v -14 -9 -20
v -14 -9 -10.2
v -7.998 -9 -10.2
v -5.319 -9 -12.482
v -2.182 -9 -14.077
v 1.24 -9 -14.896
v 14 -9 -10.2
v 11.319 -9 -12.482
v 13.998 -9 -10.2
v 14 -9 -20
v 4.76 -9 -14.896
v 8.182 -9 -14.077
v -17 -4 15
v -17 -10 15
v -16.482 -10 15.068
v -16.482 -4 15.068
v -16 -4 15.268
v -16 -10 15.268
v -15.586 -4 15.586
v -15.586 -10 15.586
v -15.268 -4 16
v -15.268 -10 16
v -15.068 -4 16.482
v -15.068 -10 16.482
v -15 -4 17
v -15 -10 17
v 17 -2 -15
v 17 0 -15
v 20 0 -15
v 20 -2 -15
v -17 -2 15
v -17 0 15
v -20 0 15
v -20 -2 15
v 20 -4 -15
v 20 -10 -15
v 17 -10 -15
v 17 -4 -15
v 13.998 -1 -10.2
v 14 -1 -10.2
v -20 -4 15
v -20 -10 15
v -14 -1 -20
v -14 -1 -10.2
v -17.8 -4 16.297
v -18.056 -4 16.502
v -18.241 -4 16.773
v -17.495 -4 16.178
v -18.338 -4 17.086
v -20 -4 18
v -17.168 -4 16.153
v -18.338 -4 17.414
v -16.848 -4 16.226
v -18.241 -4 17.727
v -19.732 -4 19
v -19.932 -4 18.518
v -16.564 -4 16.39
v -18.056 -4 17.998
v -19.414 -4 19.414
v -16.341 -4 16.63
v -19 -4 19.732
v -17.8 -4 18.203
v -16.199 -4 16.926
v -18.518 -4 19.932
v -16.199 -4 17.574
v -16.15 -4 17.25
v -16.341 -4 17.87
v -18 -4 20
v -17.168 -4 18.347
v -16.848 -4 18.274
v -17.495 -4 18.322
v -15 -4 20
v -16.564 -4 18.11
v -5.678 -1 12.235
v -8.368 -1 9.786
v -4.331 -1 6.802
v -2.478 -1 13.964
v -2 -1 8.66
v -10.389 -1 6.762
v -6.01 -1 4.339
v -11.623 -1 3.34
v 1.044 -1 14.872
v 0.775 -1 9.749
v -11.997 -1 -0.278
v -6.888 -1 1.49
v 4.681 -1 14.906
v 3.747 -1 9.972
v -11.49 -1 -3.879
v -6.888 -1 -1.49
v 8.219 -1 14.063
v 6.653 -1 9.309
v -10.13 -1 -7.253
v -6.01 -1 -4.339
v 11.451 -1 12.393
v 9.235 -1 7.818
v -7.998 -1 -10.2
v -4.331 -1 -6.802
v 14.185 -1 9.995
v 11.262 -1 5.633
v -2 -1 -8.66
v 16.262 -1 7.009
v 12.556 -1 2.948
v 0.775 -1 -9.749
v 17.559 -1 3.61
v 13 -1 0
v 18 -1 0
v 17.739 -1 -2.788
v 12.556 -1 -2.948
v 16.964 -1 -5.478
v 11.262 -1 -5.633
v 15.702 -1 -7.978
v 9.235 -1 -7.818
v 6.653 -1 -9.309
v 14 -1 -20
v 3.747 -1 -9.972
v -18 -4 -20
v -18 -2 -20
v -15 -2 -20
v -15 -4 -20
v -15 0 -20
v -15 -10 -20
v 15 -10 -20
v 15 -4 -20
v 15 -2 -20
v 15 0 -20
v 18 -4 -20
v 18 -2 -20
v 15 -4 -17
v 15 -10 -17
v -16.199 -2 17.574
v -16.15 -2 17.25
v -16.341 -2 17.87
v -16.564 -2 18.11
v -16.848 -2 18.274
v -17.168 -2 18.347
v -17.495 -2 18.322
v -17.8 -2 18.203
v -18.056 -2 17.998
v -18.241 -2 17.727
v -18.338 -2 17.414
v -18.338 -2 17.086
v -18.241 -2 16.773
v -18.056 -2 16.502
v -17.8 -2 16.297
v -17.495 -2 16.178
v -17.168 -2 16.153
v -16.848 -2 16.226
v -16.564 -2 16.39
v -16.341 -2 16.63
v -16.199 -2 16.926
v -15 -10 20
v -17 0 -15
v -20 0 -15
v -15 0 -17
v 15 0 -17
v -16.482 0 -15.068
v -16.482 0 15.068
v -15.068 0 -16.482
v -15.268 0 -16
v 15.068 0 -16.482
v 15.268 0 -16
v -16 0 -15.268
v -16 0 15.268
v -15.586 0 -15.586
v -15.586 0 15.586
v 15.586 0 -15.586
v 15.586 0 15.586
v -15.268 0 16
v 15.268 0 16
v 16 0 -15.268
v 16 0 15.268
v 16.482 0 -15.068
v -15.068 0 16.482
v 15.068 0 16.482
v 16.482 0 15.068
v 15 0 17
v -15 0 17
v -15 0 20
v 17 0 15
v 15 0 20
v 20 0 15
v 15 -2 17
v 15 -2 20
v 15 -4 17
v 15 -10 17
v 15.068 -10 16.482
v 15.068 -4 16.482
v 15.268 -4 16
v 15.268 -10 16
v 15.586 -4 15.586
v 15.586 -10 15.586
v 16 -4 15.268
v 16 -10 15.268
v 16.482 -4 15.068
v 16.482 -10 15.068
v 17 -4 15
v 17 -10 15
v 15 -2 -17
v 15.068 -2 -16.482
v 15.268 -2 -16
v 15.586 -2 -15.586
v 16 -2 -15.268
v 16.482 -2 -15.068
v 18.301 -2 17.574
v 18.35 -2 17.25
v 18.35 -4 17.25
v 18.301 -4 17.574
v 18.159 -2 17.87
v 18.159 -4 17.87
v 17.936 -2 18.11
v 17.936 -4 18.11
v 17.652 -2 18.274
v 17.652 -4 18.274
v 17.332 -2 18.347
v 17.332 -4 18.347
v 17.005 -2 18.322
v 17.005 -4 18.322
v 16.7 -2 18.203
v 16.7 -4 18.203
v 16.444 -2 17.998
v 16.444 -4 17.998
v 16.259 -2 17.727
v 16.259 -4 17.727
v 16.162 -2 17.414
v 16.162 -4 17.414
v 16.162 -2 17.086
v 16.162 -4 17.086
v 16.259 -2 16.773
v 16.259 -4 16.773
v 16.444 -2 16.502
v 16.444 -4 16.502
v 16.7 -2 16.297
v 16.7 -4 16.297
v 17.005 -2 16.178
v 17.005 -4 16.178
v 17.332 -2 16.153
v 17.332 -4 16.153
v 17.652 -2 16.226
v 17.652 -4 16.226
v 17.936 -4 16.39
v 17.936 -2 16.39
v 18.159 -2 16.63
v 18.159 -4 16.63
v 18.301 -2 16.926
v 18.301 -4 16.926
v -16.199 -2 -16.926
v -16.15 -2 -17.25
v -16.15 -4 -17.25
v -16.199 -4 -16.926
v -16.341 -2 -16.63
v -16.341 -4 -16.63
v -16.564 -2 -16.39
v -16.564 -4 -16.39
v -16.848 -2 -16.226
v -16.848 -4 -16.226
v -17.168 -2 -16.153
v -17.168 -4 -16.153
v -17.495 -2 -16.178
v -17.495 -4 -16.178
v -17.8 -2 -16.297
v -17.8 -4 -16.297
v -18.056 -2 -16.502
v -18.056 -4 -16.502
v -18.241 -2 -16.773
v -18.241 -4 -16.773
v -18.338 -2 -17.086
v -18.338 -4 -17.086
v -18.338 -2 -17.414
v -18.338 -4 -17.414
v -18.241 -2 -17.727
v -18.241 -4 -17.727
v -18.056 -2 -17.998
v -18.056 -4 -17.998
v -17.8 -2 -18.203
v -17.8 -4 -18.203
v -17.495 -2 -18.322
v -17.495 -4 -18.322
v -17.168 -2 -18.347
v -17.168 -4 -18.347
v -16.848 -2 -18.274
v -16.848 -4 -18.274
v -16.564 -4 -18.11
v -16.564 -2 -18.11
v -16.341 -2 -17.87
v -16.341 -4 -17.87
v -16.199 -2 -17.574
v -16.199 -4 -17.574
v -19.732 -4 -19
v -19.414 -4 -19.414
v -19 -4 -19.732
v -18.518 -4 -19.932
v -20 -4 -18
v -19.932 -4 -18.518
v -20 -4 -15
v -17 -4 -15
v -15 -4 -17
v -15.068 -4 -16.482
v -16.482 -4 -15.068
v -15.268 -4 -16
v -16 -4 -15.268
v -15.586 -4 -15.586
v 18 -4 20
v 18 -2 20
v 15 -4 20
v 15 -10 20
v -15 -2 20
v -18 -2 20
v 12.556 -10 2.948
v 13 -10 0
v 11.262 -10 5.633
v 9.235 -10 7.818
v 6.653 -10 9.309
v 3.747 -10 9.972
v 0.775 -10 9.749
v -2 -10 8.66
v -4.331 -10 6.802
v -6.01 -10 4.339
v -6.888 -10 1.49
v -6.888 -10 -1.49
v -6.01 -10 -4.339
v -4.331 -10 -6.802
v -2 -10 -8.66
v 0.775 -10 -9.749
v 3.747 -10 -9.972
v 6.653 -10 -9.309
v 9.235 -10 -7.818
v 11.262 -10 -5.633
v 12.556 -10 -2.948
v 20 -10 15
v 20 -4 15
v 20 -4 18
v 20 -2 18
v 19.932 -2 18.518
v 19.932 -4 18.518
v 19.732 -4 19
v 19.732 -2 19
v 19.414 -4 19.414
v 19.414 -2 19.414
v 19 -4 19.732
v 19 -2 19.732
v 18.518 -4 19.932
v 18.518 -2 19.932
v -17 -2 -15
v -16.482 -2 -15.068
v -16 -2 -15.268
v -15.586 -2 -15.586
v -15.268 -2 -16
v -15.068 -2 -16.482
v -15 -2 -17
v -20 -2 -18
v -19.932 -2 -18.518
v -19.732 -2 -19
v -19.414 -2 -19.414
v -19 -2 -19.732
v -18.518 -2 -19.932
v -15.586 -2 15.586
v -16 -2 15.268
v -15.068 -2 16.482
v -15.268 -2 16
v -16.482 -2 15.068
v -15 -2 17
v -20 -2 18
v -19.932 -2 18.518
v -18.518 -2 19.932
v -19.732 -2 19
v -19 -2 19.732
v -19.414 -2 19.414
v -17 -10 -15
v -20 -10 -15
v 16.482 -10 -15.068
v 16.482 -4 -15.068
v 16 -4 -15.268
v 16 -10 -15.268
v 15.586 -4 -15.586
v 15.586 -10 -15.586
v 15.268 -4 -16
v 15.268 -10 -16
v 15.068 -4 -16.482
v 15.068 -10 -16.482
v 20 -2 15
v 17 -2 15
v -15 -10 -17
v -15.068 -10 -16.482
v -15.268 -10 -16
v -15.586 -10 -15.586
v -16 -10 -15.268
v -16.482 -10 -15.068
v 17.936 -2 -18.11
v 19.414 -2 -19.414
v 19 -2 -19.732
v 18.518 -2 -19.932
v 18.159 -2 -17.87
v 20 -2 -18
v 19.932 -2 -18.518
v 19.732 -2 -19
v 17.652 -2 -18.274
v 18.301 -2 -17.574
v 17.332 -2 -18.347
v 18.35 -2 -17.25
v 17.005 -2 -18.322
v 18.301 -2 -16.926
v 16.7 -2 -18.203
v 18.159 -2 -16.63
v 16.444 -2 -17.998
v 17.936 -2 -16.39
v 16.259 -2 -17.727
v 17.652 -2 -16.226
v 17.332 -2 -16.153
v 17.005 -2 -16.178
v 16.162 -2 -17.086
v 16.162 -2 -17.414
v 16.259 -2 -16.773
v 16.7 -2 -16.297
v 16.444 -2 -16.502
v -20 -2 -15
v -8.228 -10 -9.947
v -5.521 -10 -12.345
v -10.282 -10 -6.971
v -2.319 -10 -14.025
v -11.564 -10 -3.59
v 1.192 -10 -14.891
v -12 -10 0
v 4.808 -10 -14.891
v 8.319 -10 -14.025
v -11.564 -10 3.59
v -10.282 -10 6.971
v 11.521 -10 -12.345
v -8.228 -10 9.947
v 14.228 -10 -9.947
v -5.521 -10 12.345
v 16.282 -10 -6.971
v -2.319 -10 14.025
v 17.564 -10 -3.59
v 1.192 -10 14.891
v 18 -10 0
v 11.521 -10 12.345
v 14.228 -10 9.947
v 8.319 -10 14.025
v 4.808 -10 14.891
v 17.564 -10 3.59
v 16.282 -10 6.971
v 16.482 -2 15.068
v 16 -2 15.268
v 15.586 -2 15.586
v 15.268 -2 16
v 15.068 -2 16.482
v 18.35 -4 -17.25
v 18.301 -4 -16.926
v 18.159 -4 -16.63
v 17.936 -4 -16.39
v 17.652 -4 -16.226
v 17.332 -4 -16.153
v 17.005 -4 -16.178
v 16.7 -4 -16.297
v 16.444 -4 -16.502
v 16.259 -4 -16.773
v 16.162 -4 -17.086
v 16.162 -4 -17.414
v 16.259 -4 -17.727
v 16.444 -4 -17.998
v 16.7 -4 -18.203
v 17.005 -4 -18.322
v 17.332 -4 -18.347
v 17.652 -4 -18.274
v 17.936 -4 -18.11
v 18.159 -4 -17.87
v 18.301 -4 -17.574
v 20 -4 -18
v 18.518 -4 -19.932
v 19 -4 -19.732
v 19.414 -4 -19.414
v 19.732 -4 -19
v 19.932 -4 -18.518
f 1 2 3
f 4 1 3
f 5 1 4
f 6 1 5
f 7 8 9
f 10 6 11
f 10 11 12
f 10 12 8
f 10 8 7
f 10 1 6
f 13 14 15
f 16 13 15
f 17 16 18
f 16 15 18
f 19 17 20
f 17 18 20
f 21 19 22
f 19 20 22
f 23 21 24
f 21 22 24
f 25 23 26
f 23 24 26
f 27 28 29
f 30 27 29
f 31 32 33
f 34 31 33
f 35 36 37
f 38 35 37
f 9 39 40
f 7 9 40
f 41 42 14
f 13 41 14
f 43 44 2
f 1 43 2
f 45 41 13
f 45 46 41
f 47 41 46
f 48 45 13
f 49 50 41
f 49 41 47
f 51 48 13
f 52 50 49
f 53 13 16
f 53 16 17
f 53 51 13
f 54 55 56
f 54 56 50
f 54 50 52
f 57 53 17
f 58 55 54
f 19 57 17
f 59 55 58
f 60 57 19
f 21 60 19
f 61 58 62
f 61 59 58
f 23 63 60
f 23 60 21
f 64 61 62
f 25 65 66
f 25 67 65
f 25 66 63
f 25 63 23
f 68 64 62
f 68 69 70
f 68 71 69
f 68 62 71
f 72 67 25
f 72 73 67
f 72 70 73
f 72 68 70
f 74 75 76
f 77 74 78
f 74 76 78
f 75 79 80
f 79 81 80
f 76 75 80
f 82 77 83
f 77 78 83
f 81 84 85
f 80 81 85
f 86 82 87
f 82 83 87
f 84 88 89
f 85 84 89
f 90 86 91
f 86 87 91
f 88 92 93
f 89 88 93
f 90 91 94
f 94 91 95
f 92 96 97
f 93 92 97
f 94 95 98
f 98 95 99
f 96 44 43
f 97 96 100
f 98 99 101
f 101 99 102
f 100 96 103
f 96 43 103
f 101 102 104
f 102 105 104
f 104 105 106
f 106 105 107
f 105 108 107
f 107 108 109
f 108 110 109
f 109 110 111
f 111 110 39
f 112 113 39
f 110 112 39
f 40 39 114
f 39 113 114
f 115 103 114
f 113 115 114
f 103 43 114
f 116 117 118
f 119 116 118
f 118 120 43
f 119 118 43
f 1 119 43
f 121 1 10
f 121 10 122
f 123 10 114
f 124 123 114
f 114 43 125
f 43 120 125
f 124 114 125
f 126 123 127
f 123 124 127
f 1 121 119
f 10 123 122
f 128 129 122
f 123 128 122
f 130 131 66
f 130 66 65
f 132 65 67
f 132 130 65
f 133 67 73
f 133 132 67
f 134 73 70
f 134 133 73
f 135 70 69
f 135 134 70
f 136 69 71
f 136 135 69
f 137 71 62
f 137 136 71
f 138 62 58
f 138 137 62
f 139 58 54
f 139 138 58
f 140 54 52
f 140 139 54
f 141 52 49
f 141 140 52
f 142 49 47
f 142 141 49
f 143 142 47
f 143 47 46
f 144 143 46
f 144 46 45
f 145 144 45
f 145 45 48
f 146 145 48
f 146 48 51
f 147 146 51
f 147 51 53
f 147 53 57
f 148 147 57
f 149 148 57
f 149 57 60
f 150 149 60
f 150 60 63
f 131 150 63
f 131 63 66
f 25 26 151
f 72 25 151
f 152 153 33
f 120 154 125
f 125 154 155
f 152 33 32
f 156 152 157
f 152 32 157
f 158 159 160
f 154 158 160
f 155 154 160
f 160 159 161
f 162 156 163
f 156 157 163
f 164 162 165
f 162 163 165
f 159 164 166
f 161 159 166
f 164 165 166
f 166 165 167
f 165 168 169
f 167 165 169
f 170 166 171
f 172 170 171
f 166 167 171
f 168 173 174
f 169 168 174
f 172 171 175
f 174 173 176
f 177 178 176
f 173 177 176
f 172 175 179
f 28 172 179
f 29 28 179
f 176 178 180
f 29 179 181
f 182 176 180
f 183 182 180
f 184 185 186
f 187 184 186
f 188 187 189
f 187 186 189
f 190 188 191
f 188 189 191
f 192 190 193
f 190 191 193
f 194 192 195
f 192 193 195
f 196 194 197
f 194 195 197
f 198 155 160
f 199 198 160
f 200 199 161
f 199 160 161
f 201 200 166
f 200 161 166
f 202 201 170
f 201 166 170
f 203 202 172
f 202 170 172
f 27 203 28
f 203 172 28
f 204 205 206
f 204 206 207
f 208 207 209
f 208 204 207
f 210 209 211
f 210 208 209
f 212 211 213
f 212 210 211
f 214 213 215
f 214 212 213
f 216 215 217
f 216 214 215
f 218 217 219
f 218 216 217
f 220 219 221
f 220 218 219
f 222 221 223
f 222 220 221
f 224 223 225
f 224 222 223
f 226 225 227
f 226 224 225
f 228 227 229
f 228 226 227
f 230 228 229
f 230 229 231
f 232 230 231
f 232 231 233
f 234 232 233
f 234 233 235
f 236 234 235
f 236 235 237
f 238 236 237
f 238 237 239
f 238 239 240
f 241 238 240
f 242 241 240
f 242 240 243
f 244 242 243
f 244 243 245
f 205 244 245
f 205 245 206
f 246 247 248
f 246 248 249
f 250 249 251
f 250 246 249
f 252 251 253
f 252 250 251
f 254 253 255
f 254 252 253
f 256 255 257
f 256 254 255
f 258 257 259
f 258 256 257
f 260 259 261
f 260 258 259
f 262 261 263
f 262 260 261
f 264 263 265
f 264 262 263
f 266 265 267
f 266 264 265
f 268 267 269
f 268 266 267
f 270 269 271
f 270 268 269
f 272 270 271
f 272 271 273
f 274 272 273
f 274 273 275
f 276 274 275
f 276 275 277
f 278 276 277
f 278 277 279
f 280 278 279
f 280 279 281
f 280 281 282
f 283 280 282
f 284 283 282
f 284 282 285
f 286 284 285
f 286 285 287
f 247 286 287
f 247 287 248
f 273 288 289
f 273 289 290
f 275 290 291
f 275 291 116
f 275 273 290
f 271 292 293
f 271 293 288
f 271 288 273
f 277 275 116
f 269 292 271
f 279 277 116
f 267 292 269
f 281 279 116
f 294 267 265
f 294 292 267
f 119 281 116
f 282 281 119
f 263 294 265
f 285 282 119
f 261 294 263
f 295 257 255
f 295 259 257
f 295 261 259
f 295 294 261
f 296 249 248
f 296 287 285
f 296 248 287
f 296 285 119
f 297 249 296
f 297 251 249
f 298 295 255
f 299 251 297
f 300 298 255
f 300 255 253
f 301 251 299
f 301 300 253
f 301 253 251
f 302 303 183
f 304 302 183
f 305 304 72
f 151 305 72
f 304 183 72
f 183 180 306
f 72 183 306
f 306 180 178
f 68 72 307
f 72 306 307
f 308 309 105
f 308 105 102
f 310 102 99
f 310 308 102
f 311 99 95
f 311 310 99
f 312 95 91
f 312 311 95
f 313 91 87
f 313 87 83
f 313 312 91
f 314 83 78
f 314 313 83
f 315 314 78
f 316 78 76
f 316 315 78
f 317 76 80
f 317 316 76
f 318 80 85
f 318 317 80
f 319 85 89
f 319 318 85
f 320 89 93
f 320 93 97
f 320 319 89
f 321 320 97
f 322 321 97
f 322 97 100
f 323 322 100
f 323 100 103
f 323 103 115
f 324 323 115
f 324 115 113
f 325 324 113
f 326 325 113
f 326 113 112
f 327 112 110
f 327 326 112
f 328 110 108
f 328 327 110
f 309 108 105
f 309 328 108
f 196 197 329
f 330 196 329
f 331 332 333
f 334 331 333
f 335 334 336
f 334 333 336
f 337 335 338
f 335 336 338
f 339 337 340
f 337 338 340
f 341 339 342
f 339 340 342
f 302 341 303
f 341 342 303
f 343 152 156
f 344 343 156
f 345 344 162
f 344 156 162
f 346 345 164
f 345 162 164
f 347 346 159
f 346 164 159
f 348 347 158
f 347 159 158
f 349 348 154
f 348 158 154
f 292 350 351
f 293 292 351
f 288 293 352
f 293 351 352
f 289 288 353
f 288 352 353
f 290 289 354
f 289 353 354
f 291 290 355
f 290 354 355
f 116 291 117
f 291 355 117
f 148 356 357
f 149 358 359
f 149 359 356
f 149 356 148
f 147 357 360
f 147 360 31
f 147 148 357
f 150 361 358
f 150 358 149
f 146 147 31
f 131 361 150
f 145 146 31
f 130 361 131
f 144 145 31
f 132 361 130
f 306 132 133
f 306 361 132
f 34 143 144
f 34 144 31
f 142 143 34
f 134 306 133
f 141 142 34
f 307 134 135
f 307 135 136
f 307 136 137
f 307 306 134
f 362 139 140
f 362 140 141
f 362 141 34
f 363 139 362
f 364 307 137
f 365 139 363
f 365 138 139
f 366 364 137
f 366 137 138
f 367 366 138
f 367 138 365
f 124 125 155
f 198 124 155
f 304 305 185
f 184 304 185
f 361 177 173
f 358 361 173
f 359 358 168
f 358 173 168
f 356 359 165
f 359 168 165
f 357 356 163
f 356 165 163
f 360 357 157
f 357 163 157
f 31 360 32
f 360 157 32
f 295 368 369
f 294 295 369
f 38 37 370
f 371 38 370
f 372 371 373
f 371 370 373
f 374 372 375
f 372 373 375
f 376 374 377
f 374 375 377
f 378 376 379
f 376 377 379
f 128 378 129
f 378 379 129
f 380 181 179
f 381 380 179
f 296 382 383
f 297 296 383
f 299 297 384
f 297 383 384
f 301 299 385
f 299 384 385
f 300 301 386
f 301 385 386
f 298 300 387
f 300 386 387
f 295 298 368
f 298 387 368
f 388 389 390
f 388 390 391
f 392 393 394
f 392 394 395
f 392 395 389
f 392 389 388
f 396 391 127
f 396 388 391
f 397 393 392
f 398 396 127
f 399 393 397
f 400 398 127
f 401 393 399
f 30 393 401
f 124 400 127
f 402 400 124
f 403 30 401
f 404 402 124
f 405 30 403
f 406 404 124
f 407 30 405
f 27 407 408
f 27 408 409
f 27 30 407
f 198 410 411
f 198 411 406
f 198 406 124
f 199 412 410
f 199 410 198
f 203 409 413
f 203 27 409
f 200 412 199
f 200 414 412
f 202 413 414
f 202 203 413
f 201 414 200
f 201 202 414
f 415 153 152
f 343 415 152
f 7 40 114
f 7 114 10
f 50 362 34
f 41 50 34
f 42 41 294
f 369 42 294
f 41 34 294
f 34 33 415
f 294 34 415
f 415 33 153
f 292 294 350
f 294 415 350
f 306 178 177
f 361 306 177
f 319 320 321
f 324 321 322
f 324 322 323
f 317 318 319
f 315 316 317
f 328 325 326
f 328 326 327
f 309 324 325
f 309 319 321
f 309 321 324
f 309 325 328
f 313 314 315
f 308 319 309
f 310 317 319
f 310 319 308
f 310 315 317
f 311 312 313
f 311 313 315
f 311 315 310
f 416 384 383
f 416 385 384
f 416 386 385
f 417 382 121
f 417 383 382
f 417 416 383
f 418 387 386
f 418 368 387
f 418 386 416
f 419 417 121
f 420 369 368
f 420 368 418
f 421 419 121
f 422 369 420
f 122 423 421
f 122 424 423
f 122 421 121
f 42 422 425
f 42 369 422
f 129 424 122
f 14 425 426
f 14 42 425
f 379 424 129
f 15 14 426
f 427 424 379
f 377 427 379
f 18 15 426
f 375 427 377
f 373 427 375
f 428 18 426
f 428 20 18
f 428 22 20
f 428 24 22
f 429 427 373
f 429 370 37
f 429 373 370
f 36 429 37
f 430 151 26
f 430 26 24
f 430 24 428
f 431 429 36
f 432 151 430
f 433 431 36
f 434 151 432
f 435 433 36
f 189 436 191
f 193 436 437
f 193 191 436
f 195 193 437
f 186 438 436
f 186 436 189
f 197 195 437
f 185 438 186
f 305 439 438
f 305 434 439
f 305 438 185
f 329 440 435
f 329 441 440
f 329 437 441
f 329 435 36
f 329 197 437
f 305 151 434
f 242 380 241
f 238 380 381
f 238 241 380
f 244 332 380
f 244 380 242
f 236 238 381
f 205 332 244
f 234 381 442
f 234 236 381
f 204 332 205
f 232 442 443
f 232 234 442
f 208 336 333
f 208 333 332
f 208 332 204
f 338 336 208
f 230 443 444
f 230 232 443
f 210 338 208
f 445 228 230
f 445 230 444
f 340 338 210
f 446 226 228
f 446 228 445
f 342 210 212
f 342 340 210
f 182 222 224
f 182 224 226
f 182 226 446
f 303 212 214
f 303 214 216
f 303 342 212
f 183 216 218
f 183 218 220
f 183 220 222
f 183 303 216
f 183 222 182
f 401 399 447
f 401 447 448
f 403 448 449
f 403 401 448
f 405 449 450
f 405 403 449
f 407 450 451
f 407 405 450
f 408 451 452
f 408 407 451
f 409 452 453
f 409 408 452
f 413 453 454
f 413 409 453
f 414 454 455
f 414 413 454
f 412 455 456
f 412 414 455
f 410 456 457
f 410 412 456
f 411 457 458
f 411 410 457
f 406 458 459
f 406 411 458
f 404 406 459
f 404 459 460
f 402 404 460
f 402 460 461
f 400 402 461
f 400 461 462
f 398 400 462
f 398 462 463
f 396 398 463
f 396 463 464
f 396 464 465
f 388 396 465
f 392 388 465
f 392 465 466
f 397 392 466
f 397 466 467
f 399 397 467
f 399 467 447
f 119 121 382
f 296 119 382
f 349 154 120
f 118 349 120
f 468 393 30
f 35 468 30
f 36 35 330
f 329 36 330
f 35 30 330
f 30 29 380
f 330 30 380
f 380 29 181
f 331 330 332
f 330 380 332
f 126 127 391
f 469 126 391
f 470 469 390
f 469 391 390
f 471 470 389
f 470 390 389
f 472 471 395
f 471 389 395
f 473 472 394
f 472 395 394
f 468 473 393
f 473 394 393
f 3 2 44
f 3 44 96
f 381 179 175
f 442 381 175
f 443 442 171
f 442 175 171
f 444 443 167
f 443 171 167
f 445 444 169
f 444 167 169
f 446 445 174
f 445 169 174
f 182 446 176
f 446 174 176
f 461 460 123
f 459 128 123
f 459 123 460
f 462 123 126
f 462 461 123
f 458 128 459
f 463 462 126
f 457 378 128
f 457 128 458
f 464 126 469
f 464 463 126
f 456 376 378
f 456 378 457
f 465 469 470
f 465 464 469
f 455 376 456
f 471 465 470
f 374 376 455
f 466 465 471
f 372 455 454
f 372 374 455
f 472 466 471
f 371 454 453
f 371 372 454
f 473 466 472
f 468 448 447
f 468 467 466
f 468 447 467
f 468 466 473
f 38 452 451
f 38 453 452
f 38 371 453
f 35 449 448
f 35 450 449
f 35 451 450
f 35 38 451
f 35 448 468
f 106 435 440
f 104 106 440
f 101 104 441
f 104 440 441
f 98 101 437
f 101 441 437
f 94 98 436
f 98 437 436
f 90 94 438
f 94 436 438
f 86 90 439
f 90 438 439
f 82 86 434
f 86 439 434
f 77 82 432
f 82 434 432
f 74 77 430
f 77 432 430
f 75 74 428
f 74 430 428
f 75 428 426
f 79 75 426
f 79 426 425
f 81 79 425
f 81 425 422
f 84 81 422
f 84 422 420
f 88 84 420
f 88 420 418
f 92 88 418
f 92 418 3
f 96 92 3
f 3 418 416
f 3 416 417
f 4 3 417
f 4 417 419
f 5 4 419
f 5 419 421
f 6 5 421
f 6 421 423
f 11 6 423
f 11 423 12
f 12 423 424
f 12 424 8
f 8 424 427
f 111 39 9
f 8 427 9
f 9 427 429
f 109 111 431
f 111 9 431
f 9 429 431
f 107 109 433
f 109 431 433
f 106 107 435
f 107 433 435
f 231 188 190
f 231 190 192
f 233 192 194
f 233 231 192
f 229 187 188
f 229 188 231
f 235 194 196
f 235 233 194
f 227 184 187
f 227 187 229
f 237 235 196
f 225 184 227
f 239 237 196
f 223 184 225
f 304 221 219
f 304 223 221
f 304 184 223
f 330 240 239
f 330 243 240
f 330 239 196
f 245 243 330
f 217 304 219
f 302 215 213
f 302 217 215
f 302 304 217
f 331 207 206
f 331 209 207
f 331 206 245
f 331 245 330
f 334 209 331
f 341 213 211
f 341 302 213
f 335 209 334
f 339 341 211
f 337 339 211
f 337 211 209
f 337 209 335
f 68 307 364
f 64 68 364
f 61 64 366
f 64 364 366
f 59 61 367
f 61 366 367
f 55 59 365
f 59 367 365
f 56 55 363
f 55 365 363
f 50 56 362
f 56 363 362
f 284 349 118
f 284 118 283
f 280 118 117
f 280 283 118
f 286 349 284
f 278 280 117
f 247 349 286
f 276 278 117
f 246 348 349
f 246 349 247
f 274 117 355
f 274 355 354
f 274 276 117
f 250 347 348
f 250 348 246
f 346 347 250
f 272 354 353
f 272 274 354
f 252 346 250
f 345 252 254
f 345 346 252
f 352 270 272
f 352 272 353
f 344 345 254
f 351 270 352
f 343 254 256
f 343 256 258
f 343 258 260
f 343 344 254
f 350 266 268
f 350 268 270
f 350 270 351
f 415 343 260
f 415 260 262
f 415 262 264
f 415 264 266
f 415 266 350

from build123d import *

# Parameters (mm, degrees)
F0_R     = 1.1
F1_DEPTH = 10
F2_R     = 1.1
F3_DEPTH = 6
F4_R     = 1.1
F5_DEPTH = 2
F6_R     = 15
F6_R_2   = 10
F7_DEPTH = 9
F8_W     = 28
F8_H     = 8
F9_DEPTH = 9.8


with BuildPart() as f1:
    # F0 (on Front) → F1 (new body)
    with BuildSketch(Plane.XZ):
        with BuildLine():
            Line((-18, -20), (18, -20))
            ThreePointArc((18, -20), (19.414214, -19.414214), (20, -18))
            Line((20, -18), (20, 18))
            ThreePointArc((20, 18), (19.414214, 19.414214), (18, 20))
            Line((18, 20), (-18, 20))
            ThreePointArc((-18, 20), (-19.414214, 19.414214), (-20, 18))
            Line((-20, 18), (-20, -18))
            ThreePointArc((-20, -18), (-19.414214, -19.414214), (-18, -20))
        make_face()
        with Locations((-17.25, -17.25)):
            Circle(F0_R, mode=Mode.SUBTRACT)
        with Locations((17.25, -17.25)):
            Circle(F0_R, mode=Mode.SUBTRACT)
        with Locations((-17.25, 17.25)):
            Circle(F0_R, mode=Mode.SUBTRACT)
        with Locations((17.25, 17.25)):
            Circle(F0_R, mode=Mode.SUBTRACT)
    extrude(amount=F1_DEPTH)

    # F2 (on face) → F3 (cut)
    with BuildSketch(Plane.XZ.offset(10)):
        with BuildLine():
            Line((-18, -20), (-15, -20))
            Line((-15, -20), (-15, -17))
            ThreePointArc((-15, -17), (-15.585786, -15.585786), (-17, -15))
            Line((-17, -15), (-20, -15))
            Line((-20, -15), (-20, -18))
            ThreePointArc((-20, -18), (-19.414214, -19.414214), (-18, -20))
        make_face()
        with Locations((-17.25, -17.25)):
            Circle(F2_R, mode=Mode.SUBTRACT)
        with BuildLine():
            Line((-20, 18), (-20, 15))
            Line((-20, 15), (-17, 15))
            ThreePointArc((-17, 15), (-15.585786, 15.585786), (-15, 17))
            Line((-15, 17), (-15, 20))
            Line((-15, 20), (-18, 20))
            ThreePointArc((-18, 20), (-19.414214, 19.414214), (-20, 18))
        make_face()
        with Locations((-17.25, 17.25)):
            Circle(F2_R, mode=Mode.SUBTRACT)
        with BuildLine():
            Line((17, 15), (20, 15))
            Line((20, 15), (20, 18))
            ThreePointArc((20, 18), (19.414214, 19.414214), (18, 20))
            Line((18, 20), (15, 20))
            Line((15, 20), (15, 17))
            ThreePointArc((15, 17), (15.585786, 15.585786), (17, 15))
        make_face()
        with Locations((17.25, 17.25)):
            Circle(F2_R, mode=Mode.SUBTRACT)
        with BuildLine():
            Line((15, -17), (15, -20))
            Line((15, -20), (18, -20))
            ThreePointArc((18, -20), (19.414214, -19.414214), (20, -18))
            Line((20, -18), (20, -15))
            Line((20, -15), (17, -15))
            ThreePointArc((17, -15), (15.585786, -15.585786), (15, -17))
        make_face()
        with Locations((17.25, -17.25)):
            Circle(F2_R, mode=Mode.SUBTRACT)
    extrude(amount=-F3_DEPTH, mode=Mode.SUBTRACT)

    # F4 (on face) → F5 (cut)
    with BuildSketch(Plane(origin=(0, 0, 0), x_dir=(-1, 0, 0), z_dir=(0, 1, 0))):
        with BuildLine():
            Line((-18, -20), (-15, -20))
            Line((-15, -20), (-15, -17))
            ThreePointArc((-15, -17), (-15.585786, -15.585786), (-17, -15))
            Line((-17, -15), (-20, -15))
            Line((-20, -15), (-20, -18))
            ThreePointArc((-20, -18), (-19.414214, -19.414214), (-18, -20))
        make_face()
        with Locations((-17.25, -17.25)):
            Circle(F4_R, mode=Mode.SUBTRACT)
        with BuildLine():
            Line((-15, 17), (-15, 20))
            Line((-15, 20), (-18, 20))
            ThreePointArc((-18, 20), (-19.414214, 19.414214), (-20, 18))
            Line((-20, 18), (-20, 15))
            Line((-20, 15), (-17, 15))
            ThreePointArc((-17, 15), (-15.585786, 15.585786), (-15, 17))
        make_face()
        with Locations((-17.25, 17.25)):
            Circle(F4_R, mode=Mode.SUBTRACT)
        with BuildLine():
            Line((17, 15), (20, 15))
            Line((20, 15), (20, 18))
            ThreePointArc((20, 18), (19.414214, 19.414214), (18, 20))
            Line((18, 20), (15, 20))
            Line((15, 20), (15, 17))
            ThreePointArc((15, 17), (15.585786, 15.585786), (17, 15))
        make_face()
        with Locations((17.25, 17.25)):
            Circle(F4_R, mode=Mode.SUBTRACT)
        with BuildLine():
            Line((20, -15), (17, -15))
            ThreePointArc((17, -15), (15.585786, -15.585786), (15, -17))
            Line((15, -17), (15, -20))
            Line((15, -20), (18, -20))
            ThreePointArc((18, -20), (19.414214, -19.414214), (20, -18))
            Line((20, -18), (20, -15))
        make_face()
        with Locations((17.25, -17.25)):
            Circle(F4_R, mode=Mode.SUBTRACT)
    extrude(amount=-F5_DEPTH, mode=Mode.SUBTRACT)

    # F6 (on face) → F7 (cut)
    with BuildSketch(Plane.XZ.offset(10)):
        with Locations((3, 0)):
            Circle(F6_R)
        with Locations((3, 0)):
            Circle(F6_R_2, mode=Mode.SUBTRACT)
    extrude(amount=-F7_DEPTH, mode=Mode.SUBTRACT)

    # F8 (on face) → F9 (cut)
    with BuildSketch(Plane(origin=(0, 0, -20), x_dir=(1, 0, 0), z_dir=(0, 0, -1))):
        with Locations((0, 5)):
            Rectangle(F8_W, F8_H)
    extrude(amount=-F9_DEPTH, mode=Mode.SUBTRACT)


solid = f1.part
